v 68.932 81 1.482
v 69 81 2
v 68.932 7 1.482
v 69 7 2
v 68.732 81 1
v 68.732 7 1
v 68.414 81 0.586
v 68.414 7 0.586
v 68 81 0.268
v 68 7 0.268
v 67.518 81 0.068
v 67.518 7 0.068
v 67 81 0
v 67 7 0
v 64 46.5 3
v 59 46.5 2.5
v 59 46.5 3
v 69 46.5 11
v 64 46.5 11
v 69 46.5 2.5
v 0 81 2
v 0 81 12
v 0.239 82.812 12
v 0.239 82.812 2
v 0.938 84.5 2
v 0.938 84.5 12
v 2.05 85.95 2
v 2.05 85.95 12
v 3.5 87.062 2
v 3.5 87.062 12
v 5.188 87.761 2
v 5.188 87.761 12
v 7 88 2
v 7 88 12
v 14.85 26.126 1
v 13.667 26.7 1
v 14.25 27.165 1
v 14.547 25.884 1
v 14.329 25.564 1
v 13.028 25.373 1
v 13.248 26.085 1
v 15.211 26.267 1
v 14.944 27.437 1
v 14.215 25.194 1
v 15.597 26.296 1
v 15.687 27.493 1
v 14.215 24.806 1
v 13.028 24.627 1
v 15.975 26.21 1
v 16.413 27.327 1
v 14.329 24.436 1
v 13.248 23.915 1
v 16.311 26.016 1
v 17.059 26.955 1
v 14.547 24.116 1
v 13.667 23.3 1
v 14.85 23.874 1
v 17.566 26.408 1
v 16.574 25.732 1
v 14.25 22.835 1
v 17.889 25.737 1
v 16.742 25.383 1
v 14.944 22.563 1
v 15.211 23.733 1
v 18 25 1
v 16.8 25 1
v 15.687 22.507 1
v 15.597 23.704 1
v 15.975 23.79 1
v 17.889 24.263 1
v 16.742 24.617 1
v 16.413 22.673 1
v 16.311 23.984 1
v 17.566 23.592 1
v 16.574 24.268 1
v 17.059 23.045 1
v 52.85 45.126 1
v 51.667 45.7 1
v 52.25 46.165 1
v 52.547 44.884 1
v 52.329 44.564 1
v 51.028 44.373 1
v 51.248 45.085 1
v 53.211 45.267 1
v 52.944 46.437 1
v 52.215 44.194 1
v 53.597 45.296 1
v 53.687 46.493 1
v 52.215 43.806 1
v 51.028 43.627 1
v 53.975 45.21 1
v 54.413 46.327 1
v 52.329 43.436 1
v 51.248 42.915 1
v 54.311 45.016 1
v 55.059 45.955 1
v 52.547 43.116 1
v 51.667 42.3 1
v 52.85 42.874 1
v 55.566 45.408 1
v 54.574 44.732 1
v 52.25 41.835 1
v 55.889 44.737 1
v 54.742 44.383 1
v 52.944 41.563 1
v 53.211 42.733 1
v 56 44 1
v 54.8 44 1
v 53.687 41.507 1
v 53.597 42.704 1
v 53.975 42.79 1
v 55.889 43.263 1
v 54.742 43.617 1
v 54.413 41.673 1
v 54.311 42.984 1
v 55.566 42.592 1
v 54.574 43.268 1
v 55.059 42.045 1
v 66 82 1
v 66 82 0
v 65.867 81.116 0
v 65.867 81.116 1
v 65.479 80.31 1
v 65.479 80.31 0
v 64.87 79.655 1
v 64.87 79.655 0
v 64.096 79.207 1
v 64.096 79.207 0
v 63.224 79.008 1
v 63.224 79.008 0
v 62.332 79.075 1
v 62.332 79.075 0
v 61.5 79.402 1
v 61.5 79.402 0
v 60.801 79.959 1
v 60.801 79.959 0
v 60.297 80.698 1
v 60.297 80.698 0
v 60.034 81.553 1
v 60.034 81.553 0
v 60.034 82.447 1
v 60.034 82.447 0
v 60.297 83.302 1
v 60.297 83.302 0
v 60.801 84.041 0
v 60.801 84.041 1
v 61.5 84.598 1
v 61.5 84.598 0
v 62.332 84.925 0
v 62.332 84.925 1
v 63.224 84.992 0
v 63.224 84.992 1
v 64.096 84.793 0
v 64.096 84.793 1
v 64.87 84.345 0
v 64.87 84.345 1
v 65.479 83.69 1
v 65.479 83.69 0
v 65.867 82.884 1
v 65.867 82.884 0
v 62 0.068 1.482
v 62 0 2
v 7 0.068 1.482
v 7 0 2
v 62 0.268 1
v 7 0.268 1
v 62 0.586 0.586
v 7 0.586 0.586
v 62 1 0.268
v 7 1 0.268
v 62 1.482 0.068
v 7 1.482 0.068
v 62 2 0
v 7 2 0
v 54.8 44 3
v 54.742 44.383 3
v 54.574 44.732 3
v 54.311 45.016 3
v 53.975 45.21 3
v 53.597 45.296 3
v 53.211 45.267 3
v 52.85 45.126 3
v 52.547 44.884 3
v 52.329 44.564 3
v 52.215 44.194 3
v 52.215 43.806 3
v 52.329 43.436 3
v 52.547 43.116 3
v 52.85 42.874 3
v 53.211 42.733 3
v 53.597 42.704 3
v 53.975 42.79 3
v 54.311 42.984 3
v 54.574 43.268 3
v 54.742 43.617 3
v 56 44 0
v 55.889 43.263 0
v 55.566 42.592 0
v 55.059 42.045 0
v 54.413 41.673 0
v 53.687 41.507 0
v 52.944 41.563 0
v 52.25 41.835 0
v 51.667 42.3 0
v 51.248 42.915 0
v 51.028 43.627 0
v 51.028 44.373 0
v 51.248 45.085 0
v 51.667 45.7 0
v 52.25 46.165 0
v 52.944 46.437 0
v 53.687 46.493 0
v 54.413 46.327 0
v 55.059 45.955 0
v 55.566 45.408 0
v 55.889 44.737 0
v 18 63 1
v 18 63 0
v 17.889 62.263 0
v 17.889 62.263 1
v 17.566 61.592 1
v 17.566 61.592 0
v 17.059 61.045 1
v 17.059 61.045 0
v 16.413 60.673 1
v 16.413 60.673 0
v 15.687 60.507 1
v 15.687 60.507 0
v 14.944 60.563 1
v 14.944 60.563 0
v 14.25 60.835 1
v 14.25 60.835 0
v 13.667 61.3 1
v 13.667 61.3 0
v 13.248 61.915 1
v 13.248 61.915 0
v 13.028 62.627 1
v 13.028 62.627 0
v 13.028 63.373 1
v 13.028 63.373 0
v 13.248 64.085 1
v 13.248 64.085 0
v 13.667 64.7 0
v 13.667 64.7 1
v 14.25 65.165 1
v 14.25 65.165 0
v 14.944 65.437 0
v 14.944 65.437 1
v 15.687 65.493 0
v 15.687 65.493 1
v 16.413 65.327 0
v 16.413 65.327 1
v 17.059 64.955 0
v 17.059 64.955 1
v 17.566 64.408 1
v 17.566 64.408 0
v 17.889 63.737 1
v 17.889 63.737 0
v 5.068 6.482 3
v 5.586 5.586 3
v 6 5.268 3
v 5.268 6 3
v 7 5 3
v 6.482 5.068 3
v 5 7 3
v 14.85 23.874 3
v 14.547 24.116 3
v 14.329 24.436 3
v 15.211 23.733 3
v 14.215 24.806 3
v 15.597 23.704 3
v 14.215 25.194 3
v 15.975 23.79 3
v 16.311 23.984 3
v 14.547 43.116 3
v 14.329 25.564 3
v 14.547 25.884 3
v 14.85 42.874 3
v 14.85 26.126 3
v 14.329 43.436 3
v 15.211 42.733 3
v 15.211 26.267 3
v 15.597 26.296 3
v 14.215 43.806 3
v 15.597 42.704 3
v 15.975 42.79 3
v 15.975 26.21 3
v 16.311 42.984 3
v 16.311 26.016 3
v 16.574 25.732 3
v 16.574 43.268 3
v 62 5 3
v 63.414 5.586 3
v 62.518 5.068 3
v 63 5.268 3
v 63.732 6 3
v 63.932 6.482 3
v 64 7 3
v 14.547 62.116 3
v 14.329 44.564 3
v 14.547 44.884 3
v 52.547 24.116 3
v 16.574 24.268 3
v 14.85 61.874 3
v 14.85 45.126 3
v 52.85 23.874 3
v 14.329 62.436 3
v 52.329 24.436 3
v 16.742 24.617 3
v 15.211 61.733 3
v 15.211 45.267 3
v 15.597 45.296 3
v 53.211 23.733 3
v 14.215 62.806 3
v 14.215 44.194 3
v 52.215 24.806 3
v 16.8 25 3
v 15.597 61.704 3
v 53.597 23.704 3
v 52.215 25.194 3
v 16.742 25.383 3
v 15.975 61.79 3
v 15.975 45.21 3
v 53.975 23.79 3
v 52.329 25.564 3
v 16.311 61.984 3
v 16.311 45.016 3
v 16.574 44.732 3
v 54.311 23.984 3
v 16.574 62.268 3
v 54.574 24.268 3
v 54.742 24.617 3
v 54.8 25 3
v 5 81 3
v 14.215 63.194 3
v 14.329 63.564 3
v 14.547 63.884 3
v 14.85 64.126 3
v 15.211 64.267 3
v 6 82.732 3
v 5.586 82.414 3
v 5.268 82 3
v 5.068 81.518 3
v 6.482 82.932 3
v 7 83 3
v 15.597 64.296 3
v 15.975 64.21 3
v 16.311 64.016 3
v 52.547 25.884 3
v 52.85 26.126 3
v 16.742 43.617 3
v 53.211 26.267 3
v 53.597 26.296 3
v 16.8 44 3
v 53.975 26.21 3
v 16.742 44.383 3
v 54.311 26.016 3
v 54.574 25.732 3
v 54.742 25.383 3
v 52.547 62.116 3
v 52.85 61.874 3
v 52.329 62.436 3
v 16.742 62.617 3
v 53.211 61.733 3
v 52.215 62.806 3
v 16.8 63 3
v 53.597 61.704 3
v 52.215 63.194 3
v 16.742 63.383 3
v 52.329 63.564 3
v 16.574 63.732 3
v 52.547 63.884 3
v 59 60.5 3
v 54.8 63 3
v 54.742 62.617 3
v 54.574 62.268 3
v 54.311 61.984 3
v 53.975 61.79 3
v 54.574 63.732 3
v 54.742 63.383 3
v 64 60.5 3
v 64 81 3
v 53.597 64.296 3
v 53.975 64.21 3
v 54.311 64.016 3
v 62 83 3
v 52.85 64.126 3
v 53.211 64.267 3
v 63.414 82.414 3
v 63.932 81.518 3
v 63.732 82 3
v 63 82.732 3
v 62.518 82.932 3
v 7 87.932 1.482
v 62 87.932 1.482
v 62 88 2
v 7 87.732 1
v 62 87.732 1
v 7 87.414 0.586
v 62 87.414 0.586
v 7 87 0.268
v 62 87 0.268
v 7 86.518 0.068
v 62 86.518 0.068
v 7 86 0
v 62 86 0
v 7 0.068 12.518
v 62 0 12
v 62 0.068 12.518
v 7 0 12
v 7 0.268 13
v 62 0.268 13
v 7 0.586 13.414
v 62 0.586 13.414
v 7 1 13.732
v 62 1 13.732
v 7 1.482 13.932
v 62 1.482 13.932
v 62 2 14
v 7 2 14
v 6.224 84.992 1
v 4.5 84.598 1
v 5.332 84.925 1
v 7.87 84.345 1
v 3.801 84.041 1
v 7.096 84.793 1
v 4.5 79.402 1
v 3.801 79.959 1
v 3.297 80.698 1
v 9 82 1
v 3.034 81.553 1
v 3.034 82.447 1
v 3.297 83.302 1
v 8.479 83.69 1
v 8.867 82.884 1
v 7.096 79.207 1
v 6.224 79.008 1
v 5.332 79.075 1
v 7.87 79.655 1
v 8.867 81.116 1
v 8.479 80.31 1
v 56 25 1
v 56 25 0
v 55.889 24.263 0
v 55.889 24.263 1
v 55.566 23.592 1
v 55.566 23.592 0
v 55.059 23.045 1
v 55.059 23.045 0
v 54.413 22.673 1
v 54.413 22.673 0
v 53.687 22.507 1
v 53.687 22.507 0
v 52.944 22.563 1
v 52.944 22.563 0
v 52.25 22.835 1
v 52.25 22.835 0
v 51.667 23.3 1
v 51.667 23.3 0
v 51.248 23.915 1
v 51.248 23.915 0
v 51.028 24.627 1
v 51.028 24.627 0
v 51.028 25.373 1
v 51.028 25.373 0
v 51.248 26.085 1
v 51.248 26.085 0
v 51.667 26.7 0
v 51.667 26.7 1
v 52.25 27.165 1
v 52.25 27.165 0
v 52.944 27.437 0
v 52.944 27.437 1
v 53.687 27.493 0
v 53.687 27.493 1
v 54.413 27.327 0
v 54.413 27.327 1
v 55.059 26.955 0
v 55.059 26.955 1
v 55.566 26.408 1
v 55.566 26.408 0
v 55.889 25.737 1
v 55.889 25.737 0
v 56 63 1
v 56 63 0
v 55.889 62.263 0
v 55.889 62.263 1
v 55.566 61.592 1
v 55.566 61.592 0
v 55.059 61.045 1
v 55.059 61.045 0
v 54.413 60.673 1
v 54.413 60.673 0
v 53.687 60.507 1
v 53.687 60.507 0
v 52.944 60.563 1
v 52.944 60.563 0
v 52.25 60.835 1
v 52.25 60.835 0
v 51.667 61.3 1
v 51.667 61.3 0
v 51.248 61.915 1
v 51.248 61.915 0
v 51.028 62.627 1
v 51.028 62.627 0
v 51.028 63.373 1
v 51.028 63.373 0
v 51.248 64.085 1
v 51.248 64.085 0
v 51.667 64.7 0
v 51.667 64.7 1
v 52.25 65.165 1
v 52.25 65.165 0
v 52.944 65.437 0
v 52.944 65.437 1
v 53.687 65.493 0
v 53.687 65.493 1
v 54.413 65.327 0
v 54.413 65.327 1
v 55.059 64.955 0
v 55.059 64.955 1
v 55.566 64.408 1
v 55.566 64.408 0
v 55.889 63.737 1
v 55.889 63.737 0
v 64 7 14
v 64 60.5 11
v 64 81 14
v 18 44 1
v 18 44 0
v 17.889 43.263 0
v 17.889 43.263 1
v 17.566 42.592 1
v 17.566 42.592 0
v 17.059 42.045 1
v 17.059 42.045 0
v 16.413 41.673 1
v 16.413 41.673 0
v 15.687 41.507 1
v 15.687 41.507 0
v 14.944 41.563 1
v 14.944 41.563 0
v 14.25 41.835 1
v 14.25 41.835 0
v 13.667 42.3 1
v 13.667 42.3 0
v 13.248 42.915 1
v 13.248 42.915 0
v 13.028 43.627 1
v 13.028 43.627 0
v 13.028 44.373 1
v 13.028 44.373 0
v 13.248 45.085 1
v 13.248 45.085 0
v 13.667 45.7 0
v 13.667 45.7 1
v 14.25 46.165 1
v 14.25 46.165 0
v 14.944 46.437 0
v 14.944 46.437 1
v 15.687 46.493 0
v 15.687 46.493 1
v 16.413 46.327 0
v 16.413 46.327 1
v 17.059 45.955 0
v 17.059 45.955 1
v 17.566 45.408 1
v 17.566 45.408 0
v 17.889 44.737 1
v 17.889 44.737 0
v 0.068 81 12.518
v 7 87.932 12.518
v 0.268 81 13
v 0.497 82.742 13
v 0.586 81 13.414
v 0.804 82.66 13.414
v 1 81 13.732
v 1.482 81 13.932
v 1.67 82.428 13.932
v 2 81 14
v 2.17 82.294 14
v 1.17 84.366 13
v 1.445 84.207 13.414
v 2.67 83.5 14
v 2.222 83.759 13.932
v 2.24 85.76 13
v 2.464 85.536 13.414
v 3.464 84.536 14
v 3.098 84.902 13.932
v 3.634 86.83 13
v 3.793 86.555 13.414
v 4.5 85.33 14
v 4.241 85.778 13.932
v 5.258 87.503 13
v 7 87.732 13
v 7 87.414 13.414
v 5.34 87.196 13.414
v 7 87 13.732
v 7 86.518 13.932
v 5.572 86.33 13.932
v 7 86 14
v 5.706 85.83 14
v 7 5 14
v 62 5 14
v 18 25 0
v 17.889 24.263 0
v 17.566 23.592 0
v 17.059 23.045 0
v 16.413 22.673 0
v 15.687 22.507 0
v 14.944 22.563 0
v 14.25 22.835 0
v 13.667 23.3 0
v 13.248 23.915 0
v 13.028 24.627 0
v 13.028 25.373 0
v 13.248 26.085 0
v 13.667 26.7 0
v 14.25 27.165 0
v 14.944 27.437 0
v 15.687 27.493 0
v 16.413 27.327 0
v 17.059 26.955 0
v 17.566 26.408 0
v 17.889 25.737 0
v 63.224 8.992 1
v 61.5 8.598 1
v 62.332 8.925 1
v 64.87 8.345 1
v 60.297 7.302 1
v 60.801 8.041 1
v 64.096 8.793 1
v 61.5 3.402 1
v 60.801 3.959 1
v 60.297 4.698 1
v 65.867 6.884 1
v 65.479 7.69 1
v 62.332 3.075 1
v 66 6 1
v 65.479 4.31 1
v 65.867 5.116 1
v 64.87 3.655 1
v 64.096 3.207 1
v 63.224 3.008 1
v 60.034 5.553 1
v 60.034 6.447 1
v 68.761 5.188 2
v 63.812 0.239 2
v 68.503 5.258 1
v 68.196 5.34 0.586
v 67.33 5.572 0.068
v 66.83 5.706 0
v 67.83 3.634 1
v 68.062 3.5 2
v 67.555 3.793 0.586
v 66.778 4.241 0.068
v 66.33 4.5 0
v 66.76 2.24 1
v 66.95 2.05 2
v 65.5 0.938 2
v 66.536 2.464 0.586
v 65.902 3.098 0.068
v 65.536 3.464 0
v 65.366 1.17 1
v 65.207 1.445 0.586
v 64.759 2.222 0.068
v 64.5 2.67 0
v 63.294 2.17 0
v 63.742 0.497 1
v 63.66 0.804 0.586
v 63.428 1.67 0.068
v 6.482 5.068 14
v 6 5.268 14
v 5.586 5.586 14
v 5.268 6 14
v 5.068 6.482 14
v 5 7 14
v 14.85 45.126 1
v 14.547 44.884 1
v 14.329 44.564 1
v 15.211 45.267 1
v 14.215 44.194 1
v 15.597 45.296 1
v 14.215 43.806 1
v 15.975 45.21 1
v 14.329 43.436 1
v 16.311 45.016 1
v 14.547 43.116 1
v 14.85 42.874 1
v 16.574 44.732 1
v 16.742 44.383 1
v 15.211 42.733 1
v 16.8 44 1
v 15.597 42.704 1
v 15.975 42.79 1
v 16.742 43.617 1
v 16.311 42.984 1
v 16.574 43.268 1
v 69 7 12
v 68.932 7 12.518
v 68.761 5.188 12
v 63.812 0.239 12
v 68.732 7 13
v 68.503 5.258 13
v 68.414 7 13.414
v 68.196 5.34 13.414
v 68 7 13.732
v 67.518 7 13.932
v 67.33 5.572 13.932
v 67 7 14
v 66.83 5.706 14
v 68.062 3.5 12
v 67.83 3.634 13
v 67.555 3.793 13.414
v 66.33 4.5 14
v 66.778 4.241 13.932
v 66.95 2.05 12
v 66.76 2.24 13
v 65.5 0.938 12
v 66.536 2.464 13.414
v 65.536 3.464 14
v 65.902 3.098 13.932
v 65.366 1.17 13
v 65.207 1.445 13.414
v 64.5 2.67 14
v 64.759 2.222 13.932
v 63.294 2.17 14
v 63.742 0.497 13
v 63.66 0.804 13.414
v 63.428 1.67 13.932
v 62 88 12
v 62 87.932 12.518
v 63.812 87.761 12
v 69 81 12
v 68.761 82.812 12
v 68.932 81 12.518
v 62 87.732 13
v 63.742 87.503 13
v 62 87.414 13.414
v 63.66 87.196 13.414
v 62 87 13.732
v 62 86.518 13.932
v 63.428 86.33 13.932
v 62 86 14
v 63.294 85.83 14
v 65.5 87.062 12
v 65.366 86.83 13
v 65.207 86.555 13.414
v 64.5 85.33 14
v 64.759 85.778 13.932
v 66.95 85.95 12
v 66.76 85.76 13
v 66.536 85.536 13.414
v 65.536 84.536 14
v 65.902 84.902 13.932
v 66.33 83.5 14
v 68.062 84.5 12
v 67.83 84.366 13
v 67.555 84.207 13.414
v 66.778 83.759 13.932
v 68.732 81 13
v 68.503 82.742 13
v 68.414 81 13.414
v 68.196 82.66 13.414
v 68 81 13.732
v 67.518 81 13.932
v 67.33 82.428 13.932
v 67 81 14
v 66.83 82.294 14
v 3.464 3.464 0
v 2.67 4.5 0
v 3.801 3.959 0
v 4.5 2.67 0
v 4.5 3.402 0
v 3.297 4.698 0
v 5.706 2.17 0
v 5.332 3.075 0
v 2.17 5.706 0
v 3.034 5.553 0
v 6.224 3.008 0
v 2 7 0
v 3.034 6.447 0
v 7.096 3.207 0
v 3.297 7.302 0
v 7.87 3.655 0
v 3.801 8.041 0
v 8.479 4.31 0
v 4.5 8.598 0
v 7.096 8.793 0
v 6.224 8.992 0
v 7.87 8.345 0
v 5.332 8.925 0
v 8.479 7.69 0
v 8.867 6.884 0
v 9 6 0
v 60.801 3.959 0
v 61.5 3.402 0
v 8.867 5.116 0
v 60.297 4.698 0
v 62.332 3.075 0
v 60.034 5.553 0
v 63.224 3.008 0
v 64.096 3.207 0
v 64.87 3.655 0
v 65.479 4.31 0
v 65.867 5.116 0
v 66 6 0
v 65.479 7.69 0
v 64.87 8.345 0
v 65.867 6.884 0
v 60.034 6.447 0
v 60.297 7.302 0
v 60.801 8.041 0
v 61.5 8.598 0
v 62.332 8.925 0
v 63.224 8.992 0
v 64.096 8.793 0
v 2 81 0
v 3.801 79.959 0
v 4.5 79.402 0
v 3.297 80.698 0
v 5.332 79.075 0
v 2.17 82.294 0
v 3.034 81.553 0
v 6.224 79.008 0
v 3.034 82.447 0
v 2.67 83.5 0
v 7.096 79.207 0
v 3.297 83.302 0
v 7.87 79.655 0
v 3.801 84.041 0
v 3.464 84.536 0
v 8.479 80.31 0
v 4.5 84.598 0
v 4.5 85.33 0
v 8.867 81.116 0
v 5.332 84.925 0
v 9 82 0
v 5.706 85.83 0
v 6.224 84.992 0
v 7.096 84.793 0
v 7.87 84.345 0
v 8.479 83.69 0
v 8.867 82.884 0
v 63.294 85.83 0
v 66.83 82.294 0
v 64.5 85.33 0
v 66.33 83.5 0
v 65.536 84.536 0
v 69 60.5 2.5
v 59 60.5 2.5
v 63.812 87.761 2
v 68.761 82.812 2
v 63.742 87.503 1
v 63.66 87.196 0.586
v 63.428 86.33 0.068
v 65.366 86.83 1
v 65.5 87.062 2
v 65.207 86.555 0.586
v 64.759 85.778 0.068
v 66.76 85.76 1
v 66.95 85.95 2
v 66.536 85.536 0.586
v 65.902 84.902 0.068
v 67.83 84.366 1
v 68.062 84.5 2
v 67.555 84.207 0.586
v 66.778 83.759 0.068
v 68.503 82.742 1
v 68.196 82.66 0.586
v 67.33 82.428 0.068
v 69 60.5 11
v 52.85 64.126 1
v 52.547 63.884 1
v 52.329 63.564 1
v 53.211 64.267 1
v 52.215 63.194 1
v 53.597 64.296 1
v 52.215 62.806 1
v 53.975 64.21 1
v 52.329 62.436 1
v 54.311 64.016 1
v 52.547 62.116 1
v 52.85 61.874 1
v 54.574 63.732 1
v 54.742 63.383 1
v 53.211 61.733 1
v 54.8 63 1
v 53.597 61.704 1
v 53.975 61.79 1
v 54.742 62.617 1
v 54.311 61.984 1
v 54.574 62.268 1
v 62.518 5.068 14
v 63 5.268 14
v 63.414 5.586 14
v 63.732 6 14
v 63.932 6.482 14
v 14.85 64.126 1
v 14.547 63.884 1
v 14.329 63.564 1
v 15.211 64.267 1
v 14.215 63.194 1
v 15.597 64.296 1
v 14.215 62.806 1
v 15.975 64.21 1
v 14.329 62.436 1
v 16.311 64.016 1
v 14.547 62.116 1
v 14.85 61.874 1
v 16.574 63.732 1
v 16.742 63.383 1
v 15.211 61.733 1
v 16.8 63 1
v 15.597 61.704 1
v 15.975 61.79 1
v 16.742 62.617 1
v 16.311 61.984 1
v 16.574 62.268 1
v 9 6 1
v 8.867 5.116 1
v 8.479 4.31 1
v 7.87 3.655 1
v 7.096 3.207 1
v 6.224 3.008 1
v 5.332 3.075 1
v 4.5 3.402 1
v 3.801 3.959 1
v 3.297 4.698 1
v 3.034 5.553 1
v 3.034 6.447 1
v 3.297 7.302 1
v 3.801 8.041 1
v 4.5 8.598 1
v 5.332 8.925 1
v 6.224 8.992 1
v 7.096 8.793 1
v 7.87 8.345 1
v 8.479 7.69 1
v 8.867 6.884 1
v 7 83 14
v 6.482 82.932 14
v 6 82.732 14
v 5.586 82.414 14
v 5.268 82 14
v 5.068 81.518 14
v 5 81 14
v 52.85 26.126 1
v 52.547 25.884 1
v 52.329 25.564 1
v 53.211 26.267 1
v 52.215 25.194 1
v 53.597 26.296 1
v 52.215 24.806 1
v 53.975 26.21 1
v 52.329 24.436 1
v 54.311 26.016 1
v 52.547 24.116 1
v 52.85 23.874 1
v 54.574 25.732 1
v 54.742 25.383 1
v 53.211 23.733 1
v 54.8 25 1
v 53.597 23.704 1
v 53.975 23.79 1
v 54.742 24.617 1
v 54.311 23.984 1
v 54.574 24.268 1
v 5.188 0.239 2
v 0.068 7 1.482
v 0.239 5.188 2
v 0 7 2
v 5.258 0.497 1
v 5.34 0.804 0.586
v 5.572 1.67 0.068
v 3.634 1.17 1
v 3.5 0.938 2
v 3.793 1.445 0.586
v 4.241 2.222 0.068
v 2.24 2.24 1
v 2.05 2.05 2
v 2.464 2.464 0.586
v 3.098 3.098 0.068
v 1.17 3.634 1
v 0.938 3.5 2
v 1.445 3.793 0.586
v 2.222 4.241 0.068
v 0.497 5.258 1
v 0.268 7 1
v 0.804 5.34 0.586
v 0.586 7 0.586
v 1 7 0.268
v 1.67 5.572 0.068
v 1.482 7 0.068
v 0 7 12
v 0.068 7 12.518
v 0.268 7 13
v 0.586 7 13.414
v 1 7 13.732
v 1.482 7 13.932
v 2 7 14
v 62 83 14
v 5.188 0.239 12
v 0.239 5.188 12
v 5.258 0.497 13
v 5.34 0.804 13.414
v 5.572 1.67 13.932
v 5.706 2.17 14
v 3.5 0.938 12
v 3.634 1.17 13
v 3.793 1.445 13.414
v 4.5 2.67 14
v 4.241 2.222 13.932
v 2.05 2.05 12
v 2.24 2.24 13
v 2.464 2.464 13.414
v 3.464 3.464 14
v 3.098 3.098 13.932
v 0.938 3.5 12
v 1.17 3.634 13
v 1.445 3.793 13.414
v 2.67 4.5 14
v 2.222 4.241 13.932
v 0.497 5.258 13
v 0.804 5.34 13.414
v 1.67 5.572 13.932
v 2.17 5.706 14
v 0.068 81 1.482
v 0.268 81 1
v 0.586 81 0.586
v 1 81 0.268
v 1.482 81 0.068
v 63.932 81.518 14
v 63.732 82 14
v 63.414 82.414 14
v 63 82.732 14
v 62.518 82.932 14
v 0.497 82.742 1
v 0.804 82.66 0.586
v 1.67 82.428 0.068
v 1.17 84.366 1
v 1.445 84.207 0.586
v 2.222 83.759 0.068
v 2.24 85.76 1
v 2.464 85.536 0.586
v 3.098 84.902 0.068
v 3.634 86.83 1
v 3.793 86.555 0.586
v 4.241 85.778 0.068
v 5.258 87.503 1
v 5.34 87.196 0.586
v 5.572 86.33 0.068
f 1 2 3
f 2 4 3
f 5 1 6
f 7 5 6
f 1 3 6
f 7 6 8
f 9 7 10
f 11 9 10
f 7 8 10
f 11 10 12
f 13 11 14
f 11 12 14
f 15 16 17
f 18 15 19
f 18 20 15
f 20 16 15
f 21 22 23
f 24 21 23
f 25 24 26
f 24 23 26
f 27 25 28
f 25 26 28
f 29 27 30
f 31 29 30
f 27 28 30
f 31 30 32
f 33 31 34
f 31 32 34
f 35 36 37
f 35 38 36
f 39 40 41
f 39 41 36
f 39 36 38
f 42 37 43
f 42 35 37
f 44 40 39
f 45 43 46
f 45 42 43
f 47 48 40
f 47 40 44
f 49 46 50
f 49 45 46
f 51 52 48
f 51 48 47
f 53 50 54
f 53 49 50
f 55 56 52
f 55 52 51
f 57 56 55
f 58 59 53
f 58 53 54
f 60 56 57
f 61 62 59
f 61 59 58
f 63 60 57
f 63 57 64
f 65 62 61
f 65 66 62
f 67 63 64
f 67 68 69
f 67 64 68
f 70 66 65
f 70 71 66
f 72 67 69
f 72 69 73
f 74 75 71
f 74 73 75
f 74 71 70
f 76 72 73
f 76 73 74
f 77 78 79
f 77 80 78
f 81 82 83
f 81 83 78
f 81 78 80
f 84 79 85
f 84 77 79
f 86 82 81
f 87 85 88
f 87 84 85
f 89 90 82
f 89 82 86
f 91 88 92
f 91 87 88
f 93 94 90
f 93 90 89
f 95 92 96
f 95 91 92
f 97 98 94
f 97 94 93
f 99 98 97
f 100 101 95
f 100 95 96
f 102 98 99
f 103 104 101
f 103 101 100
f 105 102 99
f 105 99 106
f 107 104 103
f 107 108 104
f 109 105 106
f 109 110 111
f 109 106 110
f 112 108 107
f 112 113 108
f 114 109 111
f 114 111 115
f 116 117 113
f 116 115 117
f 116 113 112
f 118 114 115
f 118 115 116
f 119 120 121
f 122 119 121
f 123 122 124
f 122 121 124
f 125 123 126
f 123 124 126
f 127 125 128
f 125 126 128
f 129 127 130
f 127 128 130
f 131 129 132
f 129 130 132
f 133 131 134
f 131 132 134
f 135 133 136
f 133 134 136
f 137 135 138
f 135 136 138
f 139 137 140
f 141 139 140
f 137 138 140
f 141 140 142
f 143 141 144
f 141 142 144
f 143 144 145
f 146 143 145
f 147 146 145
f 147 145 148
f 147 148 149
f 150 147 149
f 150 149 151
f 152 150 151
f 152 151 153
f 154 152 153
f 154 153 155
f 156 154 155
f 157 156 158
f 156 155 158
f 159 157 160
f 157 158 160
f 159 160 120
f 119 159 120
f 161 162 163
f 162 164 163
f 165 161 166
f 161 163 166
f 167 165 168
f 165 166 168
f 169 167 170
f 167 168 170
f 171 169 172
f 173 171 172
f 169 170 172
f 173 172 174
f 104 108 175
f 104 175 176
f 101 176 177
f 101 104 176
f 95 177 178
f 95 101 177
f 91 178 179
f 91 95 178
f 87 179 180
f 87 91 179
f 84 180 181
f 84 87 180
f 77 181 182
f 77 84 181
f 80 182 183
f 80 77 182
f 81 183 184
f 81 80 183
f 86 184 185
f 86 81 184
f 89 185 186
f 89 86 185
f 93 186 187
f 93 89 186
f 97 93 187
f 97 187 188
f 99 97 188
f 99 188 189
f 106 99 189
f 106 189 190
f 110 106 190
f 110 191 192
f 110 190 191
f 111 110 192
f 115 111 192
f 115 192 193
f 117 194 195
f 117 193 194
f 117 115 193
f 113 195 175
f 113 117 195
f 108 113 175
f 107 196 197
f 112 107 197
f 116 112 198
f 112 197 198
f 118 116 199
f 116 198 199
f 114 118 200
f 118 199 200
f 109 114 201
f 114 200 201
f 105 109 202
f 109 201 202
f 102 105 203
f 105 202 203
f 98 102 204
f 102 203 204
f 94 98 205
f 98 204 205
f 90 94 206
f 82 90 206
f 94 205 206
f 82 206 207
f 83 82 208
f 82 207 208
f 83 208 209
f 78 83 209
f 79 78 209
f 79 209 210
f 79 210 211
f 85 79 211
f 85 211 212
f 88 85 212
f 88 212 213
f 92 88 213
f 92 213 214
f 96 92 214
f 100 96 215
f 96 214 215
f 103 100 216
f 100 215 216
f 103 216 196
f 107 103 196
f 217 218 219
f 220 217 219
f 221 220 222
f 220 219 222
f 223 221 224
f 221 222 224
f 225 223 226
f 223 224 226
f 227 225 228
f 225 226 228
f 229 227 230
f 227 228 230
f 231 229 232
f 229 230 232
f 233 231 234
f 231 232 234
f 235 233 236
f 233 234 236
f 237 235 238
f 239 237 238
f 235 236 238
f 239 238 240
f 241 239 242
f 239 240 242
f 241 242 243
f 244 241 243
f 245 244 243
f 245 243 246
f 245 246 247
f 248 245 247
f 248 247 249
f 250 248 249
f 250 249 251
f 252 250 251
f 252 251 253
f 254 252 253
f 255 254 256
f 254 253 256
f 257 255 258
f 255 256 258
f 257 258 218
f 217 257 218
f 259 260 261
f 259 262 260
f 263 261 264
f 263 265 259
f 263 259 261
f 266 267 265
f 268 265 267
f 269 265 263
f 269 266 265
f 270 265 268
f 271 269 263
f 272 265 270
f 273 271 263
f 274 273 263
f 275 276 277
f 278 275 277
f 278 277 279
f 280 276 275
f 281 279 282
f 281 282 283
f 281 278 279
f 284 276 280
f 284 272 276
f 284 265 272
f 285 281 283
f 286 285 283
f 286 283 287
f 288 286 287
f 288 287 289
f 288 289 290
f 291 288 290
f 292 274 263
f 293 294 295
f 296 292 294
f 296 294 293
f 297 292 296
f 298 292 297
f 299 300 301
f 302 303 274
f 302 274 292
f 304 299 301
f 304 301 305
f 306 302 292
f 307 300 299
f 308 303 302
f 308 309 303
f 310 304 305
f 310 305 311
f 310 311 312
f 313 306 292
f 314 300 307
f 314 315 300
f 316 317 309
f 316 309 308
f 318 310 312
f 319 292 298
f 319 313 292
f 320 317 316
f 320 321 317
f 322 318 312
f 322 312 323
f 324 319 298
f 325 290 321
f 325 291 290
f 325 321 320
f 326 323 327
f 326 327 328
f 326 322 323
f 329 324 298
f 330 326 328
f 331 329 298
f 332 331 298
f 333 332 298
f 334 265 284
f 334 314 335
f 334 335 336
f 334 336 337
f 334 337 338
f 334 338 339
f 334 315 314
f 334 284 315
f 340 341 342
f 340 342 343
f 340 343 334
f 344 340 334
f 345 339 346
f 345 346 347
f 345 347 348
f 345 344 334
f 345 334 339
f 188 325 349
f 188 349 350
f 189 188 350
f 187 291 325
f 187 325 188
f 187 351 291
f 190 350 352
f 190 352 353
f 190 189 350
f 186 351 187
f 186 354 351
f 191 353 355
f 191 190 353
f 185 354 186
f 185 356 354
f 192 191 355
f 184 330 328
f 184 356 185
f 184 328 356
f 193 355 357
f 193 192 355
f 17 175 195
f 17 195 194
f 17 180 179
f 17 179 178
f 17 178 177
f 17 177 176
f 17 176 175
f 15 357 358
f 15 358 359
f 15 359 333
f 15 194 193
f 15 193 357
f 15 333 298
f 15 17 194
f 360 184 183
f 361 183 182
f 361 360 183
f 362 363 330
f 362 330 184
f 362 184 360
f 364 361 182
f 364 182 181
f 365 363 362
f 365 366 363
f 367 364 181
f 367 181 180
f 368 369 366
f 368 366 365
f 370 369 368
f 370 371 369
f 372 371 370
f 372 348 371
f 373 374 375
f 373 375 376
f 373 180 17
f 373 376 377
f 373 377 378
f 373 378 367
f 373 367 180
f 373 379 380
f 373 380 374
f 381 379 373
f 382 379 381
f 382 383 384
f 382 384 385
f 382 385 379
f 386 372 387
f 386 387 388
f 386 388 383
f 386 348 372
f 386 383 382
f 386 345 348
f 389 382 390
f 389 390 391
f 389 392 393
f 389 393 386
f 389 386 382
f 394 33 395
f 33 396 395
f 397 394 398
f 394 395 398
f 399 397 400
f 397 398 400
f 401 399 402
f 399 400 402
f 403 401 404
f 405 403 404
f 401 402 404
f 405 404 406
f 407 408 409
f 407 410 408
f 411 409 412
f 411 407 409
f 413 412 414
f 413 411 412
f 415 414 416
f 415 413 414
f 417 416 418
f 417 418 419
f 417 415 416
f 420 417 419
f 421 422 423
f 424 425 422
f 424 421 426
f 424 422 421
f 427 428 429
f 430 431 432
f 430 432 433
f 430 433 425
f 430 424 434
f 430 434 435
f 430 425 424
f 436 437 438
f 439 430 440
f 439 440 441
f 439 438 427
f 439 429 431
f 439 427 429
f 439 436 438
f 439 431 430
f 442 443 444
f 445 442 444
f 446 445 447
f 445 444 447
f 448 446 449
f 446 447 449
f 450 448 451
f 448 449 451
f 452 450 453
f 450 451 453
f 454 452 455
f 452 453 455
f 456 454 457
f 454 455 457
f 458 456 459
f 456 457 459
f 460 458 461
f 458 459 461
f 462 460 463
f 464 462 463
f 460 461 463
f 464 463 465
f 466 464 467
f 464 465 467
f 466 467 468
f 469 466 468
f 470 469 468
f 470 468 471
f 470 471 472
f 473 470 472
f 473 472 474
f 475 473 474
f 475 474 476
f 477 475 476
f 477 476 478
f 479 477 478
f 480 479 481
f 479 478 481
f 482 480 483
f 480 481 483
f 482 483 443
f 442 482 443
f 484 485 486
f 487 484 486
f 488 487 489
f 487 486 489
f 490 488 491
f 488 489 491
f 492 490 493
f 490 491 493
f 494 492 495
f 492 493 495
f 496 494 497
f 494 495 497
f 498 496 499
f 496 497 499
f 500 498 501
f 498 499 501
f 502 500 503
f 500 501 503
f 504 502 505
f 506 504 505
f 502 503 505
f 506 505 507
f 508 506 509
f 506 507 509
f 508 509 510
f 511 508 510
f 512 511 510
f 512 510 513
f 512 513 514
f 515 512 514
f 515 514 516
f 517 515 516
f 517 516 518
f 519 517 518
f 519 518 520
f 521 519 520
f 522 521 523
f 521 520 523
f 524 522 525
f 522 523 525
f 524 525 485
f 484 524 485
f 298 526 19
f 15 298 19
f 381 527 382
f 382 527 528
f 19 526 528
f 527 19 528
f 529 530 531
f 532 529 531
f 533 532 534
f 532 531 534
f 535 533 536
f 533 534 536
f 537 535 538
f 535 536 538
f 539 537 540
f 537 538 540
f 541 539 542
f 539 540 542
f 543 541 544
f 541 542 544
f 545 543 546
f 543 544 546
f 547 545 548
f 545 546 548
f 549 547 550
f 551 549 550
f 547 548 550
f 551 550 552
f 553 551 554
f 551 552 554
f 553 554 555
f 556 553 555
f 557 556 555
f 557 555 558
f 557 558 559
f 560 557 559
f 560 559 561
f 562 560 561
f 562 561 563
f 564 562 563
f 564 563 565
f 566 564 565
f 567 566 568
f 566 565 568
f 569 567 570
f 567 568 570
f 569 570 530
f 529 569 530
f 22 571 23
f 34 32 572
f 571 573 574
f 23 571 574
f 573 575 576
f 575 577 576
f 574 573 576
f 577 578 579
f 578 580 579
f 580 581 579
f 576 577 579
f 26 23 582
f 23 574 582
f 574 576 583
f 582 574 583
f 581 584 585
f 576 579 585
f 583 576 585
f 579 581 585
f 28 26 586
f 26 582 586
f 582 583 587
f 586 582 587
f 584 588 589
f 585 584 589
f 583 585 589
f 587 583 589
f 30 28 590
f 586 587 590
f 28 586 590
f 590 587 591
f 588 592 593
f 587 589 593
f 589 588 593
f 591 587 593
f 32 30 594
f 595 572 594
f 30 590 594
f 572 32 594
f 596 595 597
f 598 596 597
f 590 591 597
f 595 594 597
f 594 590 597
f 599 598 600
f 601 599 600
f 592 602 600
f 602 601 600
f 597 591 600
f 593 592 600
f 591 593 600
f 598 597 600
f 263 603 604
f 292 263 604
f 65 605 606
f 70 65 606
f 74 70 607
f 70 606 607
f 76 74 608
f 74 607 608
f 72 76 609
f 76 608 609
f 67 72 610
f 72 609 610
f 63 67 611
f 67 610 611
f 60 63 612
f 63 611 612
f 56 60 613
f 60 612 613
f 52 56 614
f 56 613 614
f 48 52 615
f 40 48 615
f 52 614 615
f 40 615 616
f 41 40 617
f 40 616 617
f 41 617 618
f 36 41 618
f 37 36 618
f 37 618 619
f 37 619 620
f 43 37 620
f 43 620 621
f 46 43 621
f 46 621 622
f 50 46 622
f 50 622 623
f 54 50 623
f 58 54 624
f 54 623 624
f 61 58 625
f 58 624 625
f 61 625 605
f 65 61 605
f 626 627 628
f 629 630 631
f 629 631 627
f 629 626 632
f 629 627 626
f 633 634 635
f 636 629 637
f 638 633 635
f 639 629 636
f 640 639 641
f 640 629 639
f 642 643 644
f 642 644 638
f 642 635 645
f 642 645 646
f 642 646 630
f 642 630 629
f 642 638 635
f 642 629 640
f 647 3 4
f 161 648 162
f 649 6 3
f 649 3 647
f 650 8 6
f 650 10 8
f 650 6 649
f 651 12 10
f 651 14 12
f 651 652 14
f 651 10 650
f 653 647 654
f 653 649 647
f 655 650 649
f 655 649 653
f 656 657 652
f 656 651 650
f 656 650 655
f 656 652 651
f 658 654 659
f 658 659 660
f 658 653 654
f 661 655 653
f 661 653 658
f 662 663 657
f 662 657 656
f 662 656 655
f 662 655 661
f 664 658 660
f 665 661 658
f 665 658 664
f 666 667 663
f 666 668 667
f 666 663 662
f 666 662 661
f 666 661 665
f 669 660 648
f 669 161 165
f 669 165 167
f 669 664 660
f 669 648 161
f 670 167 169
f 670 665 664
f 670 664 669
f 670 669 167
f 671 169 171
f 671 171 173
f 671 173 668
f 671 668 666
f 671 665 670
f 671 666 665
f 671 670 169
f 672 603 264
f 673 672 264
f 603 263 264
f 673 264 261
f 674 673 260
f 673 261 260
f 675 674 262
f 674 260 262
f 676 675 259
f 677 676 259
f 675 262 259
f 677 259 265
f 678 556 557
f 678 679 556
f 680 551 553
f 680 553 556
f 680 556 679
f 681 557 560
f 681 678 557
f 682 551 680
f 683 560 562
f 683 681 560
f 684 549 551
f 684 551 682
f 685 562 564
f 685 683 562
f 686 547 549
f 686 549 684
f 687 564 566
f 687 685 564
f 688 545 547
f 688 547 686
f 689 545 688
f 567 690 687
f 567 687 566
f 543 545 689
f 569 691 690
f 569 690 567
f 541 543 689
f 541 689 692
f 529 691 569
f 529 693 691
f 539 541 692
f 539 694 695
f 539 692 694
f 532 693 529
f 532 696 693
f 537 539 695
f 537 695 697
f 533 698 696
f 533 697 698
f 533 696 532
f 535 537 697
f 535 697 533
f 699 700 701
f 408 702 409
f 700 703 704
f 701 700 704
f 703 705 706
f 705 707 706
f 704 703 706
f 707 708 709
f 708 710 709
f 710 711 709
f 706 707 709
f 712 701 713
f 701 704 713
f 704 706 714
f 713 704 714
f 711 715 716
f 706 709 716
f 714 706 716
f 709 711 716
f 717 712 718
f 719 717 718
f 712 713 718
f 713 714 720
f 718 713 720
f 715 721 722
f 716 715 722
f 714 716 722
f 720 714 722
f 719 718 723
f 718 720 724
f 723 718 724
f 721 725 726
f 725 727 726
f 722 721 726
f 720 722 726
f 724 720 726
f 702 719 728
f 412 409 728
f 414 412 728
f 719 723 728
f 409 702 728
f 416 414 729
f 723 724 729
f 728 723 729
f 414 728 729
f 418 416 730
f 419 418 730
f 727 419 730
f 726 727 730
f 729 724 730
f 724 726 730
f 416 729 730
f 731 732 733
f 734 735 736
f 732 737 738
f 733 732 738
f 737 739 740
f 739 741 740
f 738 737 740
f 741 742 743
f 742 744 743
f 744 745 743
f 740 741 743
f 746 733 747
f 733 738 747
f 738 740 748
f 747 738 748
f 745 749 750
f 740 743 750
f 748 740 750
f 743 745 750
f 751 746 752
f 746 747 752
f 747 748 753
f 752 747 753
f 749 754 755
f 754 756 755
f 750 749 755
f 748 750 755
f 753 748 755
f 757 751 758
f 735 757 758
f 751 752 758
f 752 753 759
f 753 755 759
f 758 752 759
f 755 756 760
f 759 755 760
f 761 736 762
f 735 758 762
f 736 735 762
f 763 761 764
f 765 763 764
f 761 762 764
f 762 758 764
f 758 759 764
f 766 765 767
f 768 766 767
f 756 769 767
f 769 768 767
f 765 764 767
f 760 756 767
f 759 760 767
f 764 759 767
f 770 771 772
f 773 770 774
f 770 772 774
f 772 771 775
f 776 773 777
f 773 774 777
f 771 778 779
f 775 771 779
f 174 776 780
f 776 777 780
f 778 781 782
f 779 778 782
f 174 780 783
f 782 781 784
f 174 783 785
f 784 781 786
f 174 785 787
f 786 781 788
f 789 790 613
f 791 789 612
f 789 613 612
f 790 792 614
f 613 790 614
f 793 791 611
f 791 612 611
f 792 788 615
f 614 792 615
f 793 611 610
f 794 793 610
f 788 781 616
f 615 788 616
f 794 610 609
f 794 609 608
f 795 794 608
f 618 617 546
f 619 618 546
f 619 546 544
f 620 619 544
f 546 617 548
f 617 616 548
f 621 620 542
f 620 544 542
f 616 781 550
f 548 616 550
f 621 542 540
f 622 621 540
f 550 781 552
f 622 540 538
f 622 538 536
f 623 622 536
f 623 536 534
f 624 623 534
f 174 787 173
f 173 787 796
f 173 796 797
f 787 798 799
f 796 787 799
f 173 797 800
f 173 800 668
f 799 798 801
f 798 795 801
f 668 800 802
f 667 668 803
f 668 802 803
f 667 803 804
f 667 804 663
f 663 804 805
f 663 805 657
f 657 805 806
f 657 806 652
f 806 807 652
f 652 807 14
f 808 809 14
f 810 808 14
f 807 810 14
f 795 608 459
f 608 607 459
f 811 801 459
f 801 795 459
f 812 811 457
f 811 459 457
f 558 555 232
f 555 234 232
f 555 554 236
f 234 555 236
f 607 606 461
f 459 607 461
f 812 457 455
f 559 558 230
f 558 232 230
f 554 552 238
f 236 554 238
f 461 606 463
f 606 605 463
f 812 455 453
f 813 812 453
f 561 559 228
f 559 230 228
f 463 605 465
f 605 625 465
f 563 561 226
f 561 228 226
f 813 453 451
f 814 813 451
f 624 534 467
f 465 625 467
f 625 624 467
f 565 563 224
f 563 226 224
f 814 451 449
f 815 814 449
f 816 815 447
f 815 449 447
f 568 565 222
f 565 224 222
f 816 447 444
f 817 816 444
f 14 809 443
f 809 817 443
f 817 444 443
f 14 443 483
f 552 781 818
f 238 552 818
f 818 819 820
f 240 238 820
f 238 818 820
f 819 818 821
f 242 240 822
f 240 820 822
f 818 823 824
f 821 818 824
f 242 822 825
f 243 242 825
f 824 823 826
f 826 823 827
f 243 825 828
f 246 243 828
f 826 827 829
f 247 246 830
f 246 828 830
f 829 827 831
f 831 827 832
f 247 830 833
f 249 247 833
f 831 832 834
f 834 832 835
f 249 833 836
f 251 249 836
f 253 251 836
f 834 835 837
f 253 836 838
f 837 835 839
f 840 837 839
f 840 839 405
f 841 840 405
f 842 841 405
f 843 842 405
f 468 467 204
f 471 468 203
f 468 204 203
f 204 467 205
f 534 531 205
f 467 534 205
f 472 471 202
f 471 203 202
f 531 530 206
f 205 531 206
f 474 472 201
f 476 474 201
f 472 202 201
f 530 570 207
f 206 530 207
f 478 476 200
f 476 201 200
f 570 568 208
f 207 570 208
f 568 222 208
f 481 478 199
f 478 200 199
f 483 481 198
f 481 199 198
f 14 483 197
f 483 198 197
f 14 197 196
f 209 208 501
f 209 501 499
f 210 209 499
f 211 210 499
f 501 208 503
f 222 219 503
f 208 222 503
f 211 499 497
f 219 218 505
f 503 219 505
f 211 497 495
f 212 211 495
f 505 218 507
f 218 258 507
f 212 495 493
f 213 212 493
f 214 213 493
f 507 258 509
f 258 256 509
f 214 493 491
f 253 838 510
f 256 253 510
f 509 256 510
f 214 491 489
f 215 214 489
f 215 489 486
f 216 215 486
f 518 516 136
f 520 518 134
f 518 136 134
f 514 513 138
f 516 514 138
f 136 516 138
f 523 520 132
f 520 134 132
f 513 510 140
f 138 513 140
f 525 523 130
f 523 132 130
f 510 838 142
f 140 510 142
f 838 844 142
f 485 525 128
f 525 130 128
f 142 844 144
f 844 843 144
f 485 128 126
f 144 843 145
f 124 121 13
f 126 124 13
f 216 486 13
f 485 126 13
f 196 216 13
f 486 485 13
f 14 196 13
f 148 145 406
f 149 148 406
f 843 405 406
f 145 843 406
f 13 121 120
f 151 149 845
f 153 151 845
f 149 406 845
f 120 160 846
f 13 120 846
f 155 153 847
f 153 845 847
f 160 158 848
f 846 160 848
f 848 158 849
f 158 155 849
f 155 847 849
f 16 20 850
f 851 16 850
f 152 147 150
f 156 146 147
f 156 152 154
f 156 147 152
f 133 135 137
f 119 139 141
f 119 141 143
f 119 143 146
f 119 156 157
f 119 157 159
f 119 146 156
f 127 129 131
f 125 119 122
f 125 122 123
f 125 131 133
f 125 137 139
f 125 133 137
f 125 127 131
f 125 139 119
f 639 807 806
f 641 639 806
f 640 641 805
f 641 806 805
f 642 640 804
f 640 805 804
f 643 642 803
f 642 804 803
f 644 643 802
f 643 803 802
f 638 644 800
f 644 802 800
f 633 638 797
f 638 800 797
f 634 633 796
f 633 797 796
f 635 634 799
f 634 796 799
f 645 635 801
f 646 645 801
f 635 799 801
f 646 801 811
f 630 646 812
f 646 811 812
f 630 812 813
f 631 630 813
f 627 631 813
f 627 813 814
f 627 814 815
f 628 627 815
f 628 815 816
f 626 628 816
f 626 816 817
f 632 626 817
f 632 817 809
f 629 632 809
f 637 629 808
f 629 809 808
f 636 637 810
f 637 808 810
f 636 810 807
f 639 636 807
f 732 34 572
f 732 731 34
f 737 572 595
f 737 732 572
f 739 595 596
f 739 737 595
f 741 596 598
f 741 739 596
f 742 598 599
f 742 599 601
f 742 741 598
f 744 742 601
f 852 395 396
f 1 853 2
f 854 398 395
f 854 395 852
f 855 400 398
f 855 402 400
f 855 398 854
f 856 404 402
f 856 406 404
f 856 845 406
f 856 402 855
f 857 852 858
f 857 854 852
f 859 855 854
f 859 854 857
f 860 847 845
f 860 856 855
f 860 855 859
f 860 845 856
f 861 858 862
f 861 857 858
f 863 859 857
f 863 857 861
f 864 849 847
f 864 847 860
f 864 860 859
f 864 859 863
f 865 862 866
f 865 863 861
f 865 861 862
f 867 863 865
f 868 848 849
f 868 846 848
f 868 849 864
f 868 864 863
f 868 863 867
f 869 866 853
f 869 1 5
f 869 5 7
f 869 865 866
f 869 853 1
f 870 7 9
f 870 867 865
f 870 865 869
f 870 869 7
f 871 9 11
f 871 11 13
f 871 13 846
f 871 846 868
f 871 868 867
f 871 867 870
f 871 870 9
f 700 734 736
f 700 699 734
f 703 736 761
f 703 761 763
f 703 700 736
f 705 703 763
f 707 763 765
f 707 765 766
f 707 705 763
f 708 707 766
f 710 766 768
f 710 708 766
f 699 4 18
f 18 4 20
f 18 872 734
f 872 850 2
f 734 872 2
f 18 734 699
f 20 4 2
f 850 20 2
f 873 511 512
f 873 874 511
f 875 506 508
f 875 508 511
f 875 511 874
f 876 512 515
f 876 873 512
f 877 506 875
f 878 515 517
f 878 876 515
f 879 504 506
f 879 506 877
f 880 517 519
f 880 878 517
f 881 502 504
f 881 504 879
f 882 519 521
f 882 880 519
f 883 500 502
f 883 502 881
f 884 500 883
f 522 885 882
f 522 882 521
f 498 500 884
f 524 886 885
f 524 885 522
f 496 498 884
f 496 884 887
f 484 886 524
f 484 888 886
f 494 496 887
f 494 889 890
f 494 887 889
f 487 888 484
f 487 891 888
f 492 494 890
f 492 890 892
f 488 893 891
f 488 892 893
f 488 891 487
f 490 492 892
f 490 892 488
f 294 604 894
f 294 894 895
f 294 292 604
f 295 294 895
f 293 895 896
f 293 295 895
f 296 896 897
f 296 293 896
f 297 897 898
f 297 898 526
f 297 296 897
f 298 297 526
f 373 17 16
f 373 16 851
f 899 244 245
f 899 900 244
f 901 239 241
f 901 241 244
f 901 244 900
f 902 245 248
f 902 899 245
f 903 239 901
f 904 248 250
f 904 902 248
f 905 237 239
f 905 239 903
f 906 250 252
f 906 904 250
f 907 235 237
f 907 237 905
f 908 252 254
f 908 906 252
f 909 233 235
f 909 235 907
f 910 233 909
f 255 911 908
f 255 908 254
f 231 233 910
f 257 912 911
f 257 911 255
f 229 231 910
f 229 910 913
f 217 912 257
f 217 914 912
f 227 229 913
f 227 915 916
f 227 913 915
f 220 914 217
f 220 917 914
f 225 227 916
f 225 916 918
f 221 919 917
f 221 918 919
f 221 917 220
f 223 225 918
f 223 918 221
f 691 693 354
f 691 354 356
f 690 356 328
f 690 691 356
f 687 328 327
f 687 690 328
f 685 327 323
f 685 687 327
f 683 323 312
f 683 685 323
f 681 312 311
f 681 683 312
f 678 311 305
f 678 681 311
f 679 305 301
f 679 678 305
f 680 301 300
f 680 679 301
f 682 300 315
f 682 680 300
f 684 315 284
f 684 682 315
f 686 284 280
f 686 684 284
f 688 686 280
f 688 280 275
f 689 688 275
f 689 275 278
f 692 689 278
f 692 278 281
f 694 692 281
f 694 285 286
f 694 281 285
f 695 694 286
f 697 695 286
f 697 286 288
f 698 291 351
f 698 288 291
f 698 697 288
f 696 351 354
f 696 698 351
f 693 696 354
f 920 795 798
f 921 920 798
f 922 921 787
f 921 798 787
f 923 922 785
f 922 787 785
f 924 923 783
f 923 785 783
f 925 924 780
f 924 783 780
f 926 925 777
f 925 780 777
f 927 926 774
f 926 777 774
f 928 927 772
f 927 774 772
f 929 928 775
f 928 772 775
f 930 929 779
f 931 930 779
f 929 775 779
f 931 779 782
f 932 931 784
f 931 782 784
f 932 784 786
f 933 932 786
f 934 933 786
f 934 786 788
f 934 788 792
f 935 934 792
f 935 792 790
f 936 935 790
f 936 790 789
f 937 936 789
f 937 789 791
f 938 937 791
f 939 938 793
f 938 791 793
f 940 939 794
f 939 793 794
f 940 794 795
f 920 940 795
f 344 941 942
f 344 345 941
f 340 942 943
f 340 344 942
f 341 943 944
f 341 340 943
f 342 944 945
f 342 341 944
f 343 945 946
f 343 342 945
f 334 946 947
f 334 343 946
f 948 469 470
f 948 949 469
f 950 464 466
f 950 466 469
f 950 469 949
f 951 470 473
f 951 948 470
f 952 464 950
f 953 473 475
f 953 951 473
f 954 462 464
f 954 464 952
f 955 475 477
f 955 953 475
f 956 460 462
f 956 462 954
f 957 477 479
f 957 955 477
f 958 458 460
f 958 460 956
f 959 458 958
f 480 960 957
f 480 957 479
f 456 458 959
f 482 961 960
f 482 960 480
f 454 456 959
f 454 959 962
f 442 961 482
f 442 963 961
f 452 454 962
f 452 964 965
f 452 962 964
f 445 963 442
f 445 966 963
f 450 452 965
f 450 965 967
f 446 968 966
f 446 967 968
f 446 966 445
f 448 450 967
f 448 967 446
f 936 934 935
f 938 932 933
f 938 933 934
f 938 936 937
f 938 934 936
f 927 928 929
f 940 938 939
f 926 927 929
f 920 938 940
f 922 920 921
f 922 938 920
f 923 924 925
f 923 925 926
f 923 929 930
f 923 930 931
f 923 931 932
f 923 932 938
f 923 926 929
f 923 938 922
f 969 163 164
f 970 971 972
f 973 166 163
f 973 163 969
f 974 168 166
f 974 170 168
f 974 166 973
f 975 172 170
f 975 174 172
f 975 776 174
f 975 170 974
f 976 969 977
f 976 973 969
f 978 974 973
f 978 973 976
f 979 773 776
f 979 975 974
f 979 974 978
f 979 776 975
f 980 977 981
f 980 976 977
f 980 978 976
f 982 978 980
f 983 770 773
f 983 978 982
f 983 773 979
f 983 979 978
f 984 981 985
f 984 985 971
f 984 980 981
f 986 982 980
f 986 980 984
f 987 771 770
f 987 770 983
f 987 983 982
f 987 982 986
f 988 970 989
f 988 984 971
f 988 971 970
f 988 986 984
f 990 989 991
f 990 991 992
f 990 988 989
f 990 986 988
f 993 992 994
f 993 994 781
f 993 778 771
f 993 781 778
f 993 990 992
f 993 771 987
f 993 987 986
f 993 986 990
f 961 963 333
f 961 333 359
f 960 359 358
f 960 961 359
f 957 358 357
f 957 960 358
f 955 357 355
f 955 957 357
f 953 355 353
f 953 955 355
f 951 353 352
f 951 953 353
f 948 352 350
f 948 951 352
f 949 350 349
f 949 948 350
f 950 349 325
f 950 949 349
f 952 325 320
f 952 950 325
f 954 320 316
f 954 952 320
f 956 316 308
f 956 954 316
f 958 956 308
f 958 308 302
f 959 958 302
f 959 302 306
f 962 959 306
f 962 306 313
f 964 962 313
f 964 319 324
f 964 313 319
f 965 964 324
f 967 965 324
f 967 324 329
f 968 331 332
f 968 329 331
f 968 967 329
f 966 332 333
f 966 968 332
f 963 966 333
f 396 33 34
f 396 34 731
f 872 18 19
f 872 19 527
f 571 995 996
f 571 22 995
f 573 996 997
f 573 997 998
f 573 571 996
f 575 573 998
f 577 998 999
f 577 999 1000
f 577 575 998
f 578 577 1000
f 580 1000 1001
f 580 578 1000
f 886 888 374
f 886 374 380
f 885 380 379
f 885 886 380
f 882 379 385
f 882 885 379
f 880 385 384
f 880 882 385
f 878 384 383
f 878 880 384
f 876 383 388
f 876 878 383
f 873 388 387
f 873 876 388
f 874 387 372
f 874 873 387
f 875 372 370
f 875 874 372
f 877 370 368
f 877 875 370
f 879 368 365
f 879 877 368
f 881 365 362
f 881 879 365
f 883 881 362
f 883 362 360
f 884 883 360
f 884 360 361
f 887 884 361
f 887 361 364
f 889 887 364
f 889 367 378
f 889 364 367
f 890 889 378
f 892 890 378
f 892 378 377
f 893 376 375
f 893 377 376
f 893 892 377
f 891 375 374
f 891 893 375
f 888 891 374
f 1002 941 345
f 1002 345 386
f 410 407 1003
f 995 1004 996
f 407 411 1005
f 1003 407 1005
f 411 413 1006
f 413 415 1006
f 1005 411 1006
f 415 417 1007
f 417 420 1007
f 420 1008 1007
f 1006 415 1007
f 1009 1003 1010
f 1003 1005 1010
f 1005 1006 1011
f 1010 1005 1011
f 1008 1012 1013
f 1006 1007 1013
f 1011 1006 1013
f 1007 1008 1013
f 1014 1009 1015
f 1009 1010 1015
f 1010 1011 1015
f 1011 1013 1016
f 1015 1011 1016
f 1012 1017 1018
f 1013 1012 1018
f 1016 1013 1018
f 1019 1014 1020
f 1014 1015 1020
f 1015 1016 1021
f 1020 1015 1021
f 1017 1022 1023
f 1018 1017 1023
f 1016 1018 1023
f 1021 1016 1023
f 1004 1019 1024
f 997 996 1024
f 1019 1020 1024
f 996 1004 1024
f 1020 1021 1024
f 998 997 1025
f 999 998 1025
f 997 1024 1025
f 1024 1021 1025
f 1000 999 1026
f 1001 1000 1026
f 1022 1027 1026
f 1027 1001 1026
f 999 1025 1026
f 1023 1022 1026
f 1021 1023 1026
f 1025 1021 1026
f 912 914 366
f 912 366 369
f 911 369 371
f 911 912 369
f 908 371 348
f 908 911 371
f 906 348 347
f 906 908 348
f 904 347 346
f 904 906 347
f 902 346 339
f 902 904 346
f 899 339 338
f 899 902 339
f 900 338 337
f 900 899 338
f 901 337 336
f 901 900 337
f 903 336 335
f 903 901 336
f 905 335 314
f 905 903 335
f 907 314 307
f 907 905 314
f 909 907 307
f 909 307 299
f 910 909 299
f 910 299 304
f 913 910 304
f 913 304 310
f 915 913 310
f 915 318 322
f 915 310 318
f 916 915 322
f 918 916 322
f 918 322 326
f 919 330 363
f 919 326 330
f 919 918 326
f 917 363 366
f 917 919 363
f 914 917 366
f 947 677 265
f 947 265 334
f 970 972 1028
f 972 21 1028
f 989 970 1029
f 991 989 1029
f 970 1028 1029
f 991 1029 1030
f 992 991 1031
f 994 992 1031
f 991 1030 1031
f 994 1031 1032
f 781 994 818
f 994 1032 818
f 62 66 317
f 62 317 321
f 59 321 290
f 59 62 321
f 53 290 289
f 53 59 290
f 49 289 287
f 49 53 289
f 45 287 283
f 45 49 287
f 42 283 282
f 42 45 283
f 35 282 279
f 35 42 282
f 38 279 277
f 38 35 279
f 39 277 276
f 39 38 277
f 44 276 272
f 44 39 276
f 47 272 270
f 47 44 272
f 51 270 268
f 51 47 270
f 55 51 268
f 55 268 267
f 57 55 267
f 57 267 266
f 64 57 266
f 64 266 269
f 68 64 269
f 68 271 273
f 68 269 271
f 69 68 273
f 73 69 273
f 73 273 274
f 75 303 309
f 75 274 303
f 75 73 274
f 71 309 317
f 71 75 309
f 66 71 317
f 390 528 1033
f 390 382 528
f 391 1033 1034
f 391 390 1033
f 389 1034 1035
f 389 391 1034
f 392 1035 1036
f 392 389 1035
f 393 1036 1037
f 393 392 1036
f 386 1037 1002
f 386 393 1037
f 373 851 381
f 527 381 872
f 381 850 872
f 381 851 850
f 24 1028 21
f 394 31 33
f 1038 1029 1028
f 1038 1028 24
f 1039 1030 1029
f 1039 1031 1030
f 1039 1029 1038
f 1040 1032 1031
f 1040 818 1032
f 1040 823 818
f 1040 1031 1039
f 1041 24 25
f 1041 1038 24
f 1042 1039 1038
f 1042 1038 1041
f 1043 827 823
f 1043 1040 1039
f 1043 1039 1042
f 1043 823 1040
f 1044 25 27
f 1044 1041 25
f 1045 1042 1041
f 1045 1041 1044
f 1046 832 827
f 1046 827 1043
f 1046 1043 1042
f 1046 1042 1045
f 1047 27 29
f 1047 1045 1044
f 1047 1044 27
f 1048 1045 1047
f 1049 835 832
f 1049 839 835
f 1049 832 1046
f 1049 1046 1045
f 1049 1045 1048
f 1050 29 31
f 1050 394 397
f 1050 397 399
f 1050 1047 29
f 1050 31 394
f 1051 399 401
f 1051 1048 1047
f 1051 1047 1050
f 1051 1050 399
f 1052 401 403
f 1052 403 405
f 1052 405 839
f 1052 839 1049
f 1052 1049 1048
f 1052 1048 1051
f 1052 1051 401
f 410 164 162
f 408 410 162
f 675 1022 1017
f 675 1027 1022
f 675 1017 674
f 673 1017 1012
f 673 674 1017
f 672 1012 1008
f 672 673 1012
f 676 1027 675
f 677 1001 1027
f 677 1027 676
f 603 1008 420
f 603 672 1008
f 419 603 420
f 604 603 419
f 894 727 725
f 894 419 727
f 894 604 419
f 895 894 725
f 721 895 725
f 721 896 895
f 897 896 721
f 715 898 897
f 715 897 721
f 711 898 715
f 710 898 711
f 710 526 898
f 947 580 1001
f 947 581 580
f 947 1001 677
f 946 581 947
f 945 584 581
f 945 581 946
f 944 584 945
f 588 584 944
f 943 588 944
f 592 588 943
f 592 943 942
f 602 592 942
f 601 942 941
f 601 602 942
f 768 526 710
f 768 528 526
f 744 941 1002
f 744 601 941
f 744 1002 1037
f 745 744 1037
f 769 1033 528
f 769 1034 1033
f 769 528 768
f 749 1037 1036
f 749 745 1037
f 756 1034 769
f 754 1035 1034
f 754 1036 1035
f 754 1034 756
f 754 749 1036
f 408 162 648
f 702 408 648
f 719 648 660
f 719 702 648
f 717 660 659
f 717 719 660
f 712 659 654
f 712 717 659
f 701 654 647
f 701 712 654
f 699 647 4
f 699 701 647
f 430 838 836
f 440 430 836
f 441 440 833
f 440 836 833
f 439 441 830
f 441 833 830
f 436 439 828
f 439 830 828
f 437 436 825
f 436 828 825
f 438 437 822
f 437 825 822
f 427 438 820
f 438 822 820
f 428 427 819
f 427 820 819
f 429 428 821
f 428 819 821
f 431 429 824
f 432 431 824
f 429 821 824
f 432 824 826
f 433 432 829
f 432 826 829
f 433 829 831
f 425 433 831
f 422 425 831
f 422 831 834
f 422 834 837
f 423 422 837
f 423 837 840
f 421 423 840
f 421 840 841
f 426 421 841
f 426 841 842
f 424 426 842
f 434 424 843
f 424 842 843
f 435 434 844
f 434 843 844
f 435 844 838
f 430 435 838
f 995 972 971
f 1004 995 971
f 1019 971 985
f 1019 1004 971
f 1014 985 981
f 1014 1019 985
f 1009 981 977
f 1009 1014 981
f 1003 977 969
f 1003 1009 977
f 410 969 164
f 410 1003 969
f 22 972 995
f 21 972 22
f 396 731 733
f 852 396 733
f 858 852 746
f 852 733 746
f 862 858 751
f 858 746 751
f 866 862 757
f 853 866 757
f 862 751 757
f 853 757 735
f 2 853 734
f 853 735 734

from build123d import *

# Parameters (mm, degrees)
SKETCH023_W     = 69
SKETCH023_H     = 88
SKETCH023_R     = 1.3
PAD006_DEPTH    = 14
SKETCH024_W     = 59
SKETCH024_H     = 78
POCKET014_DEPTH = 11
SKETCH025_R     = 3
SKETCH025_R_2   = 2.5
POCKET015_DEPTH = 1
FILLET006_R     = 7
FILLET007_R     = 2
SKETCH026_W     = 14
SKETCH026_H     = 8.5
POCKET016_DEPTH = 10


with BuildPart() as part:
    # Sketch023 → Pad006 (new body)
    with BuildSketch(Plane.XY):
        with Locations((34.5, 44)):
            Rectangle(SKETCH023_W, SKETCH023_H)
        with Locations((15.5, 63)):
            Circle(SKETCH023_R, mode=Mode.SUBTRACT)
        with Locations((15.5, 44)):
            Circle(SKETCH023_R, mode=Mode.SUBTRACT)
        with Locations((15.5, 25)):
            Circle(SKETCH023_R, mode=Mode.SUBTRACT)
        with Locations((53.5, 25)):
            Circle(SKETCH023_R, mode=Mode.SUBTRACT)
        with Locations((53.5, 44)):
            Circle(SKETCH023_R, mode=Mode.SUBTRACT)
        with Locations((53.5, 63)):
            Circle(SKETCH023_R, mode=Mode.SUBTRACT)
    extrude(amount=PAD006_DEPTH)

    # Sketch024 (on Face12 of Pad006) → Pocket014 (cut)
    with BuildSketch(Plane.XY.offset(14)):
        with Locations((34.5, 44)):
            Rectangle(SKETCH024_W, SKETCH024_H)
    extrude(amount=-POCKET014_DEPTH, mode=Mode.SUBTRACT)

    # Sketch025 (on Face4 of Pocket014) → Pocket015 (cut)
    with BuildSketch(Plane(origin=(0, 0, 0), x_dir=(1, 0, 0), z_dir=(0, 0, -1))):
        with Locations((6, -6)):
            Circle(SKETCH025_R)
        with Locations((63, -6)):
            Circle(SKETCH025_R)
        with Locations((63, -82)):
            Circle(SKETCH025_R)
        with Locations((6, -82)):
            Circle(SKETCH025_R)
        with Locations((15.5, -25)):
            Circle(SKETCH025_R_2)
        with Locations((15.5, -44)):
            Circle(SKETCH025_R_2)
        with Locations((15.5, -63)):
            Circle(SKETCH025_R_2)
        with Locations((53.5, -63)):
            Circle(SKETCH025_R_2)
        with Locations((53.5, -44)):
            Circle(SKETCH025_R_2)
        with Locations((53.5, -25)):
            Circle(SKETCH025_R_2)
    extrude(amount=-POCKET015_DEPTH, mode=Mode.SUBTRACT)

    # Fillet006
    fillet006_edges = [part.edges().sort_by_distance(p)[0] for p in [
        (69, 88, 7),
        (0, 88, 7),
        (0, 0, 7),
        (69, 0, 7),
    ]]
    fillet(fillet006_edges, radius=FILLET006_R)

    # Fillet007
    fillet007_edges = [part.edges().sort_by_distance(p)[0] for p in [
        (64, 5, 8.5),
        (64, 83, 8.5),
        (5, 83, 8.5),
        (5, 5, 8.5),
        (0, 44, 14),
        (0, 44, 0),
    ]]
    fillet(fillet007_edges, radius=FILLET007_R)

    # Sketch026 (on Face13 of Fillet007) → Pocket016 (cut)
    with BuildSketch(Plane.YZ.offset(69)):
        with Locations((53.5, 6.75)):
            Rectangle(SKETCH026_W, SKETCH026_H)
    extrude(amount=-POCKET016_DEPTH, mode=Mode.SUBTRACT)


solid = part.part
